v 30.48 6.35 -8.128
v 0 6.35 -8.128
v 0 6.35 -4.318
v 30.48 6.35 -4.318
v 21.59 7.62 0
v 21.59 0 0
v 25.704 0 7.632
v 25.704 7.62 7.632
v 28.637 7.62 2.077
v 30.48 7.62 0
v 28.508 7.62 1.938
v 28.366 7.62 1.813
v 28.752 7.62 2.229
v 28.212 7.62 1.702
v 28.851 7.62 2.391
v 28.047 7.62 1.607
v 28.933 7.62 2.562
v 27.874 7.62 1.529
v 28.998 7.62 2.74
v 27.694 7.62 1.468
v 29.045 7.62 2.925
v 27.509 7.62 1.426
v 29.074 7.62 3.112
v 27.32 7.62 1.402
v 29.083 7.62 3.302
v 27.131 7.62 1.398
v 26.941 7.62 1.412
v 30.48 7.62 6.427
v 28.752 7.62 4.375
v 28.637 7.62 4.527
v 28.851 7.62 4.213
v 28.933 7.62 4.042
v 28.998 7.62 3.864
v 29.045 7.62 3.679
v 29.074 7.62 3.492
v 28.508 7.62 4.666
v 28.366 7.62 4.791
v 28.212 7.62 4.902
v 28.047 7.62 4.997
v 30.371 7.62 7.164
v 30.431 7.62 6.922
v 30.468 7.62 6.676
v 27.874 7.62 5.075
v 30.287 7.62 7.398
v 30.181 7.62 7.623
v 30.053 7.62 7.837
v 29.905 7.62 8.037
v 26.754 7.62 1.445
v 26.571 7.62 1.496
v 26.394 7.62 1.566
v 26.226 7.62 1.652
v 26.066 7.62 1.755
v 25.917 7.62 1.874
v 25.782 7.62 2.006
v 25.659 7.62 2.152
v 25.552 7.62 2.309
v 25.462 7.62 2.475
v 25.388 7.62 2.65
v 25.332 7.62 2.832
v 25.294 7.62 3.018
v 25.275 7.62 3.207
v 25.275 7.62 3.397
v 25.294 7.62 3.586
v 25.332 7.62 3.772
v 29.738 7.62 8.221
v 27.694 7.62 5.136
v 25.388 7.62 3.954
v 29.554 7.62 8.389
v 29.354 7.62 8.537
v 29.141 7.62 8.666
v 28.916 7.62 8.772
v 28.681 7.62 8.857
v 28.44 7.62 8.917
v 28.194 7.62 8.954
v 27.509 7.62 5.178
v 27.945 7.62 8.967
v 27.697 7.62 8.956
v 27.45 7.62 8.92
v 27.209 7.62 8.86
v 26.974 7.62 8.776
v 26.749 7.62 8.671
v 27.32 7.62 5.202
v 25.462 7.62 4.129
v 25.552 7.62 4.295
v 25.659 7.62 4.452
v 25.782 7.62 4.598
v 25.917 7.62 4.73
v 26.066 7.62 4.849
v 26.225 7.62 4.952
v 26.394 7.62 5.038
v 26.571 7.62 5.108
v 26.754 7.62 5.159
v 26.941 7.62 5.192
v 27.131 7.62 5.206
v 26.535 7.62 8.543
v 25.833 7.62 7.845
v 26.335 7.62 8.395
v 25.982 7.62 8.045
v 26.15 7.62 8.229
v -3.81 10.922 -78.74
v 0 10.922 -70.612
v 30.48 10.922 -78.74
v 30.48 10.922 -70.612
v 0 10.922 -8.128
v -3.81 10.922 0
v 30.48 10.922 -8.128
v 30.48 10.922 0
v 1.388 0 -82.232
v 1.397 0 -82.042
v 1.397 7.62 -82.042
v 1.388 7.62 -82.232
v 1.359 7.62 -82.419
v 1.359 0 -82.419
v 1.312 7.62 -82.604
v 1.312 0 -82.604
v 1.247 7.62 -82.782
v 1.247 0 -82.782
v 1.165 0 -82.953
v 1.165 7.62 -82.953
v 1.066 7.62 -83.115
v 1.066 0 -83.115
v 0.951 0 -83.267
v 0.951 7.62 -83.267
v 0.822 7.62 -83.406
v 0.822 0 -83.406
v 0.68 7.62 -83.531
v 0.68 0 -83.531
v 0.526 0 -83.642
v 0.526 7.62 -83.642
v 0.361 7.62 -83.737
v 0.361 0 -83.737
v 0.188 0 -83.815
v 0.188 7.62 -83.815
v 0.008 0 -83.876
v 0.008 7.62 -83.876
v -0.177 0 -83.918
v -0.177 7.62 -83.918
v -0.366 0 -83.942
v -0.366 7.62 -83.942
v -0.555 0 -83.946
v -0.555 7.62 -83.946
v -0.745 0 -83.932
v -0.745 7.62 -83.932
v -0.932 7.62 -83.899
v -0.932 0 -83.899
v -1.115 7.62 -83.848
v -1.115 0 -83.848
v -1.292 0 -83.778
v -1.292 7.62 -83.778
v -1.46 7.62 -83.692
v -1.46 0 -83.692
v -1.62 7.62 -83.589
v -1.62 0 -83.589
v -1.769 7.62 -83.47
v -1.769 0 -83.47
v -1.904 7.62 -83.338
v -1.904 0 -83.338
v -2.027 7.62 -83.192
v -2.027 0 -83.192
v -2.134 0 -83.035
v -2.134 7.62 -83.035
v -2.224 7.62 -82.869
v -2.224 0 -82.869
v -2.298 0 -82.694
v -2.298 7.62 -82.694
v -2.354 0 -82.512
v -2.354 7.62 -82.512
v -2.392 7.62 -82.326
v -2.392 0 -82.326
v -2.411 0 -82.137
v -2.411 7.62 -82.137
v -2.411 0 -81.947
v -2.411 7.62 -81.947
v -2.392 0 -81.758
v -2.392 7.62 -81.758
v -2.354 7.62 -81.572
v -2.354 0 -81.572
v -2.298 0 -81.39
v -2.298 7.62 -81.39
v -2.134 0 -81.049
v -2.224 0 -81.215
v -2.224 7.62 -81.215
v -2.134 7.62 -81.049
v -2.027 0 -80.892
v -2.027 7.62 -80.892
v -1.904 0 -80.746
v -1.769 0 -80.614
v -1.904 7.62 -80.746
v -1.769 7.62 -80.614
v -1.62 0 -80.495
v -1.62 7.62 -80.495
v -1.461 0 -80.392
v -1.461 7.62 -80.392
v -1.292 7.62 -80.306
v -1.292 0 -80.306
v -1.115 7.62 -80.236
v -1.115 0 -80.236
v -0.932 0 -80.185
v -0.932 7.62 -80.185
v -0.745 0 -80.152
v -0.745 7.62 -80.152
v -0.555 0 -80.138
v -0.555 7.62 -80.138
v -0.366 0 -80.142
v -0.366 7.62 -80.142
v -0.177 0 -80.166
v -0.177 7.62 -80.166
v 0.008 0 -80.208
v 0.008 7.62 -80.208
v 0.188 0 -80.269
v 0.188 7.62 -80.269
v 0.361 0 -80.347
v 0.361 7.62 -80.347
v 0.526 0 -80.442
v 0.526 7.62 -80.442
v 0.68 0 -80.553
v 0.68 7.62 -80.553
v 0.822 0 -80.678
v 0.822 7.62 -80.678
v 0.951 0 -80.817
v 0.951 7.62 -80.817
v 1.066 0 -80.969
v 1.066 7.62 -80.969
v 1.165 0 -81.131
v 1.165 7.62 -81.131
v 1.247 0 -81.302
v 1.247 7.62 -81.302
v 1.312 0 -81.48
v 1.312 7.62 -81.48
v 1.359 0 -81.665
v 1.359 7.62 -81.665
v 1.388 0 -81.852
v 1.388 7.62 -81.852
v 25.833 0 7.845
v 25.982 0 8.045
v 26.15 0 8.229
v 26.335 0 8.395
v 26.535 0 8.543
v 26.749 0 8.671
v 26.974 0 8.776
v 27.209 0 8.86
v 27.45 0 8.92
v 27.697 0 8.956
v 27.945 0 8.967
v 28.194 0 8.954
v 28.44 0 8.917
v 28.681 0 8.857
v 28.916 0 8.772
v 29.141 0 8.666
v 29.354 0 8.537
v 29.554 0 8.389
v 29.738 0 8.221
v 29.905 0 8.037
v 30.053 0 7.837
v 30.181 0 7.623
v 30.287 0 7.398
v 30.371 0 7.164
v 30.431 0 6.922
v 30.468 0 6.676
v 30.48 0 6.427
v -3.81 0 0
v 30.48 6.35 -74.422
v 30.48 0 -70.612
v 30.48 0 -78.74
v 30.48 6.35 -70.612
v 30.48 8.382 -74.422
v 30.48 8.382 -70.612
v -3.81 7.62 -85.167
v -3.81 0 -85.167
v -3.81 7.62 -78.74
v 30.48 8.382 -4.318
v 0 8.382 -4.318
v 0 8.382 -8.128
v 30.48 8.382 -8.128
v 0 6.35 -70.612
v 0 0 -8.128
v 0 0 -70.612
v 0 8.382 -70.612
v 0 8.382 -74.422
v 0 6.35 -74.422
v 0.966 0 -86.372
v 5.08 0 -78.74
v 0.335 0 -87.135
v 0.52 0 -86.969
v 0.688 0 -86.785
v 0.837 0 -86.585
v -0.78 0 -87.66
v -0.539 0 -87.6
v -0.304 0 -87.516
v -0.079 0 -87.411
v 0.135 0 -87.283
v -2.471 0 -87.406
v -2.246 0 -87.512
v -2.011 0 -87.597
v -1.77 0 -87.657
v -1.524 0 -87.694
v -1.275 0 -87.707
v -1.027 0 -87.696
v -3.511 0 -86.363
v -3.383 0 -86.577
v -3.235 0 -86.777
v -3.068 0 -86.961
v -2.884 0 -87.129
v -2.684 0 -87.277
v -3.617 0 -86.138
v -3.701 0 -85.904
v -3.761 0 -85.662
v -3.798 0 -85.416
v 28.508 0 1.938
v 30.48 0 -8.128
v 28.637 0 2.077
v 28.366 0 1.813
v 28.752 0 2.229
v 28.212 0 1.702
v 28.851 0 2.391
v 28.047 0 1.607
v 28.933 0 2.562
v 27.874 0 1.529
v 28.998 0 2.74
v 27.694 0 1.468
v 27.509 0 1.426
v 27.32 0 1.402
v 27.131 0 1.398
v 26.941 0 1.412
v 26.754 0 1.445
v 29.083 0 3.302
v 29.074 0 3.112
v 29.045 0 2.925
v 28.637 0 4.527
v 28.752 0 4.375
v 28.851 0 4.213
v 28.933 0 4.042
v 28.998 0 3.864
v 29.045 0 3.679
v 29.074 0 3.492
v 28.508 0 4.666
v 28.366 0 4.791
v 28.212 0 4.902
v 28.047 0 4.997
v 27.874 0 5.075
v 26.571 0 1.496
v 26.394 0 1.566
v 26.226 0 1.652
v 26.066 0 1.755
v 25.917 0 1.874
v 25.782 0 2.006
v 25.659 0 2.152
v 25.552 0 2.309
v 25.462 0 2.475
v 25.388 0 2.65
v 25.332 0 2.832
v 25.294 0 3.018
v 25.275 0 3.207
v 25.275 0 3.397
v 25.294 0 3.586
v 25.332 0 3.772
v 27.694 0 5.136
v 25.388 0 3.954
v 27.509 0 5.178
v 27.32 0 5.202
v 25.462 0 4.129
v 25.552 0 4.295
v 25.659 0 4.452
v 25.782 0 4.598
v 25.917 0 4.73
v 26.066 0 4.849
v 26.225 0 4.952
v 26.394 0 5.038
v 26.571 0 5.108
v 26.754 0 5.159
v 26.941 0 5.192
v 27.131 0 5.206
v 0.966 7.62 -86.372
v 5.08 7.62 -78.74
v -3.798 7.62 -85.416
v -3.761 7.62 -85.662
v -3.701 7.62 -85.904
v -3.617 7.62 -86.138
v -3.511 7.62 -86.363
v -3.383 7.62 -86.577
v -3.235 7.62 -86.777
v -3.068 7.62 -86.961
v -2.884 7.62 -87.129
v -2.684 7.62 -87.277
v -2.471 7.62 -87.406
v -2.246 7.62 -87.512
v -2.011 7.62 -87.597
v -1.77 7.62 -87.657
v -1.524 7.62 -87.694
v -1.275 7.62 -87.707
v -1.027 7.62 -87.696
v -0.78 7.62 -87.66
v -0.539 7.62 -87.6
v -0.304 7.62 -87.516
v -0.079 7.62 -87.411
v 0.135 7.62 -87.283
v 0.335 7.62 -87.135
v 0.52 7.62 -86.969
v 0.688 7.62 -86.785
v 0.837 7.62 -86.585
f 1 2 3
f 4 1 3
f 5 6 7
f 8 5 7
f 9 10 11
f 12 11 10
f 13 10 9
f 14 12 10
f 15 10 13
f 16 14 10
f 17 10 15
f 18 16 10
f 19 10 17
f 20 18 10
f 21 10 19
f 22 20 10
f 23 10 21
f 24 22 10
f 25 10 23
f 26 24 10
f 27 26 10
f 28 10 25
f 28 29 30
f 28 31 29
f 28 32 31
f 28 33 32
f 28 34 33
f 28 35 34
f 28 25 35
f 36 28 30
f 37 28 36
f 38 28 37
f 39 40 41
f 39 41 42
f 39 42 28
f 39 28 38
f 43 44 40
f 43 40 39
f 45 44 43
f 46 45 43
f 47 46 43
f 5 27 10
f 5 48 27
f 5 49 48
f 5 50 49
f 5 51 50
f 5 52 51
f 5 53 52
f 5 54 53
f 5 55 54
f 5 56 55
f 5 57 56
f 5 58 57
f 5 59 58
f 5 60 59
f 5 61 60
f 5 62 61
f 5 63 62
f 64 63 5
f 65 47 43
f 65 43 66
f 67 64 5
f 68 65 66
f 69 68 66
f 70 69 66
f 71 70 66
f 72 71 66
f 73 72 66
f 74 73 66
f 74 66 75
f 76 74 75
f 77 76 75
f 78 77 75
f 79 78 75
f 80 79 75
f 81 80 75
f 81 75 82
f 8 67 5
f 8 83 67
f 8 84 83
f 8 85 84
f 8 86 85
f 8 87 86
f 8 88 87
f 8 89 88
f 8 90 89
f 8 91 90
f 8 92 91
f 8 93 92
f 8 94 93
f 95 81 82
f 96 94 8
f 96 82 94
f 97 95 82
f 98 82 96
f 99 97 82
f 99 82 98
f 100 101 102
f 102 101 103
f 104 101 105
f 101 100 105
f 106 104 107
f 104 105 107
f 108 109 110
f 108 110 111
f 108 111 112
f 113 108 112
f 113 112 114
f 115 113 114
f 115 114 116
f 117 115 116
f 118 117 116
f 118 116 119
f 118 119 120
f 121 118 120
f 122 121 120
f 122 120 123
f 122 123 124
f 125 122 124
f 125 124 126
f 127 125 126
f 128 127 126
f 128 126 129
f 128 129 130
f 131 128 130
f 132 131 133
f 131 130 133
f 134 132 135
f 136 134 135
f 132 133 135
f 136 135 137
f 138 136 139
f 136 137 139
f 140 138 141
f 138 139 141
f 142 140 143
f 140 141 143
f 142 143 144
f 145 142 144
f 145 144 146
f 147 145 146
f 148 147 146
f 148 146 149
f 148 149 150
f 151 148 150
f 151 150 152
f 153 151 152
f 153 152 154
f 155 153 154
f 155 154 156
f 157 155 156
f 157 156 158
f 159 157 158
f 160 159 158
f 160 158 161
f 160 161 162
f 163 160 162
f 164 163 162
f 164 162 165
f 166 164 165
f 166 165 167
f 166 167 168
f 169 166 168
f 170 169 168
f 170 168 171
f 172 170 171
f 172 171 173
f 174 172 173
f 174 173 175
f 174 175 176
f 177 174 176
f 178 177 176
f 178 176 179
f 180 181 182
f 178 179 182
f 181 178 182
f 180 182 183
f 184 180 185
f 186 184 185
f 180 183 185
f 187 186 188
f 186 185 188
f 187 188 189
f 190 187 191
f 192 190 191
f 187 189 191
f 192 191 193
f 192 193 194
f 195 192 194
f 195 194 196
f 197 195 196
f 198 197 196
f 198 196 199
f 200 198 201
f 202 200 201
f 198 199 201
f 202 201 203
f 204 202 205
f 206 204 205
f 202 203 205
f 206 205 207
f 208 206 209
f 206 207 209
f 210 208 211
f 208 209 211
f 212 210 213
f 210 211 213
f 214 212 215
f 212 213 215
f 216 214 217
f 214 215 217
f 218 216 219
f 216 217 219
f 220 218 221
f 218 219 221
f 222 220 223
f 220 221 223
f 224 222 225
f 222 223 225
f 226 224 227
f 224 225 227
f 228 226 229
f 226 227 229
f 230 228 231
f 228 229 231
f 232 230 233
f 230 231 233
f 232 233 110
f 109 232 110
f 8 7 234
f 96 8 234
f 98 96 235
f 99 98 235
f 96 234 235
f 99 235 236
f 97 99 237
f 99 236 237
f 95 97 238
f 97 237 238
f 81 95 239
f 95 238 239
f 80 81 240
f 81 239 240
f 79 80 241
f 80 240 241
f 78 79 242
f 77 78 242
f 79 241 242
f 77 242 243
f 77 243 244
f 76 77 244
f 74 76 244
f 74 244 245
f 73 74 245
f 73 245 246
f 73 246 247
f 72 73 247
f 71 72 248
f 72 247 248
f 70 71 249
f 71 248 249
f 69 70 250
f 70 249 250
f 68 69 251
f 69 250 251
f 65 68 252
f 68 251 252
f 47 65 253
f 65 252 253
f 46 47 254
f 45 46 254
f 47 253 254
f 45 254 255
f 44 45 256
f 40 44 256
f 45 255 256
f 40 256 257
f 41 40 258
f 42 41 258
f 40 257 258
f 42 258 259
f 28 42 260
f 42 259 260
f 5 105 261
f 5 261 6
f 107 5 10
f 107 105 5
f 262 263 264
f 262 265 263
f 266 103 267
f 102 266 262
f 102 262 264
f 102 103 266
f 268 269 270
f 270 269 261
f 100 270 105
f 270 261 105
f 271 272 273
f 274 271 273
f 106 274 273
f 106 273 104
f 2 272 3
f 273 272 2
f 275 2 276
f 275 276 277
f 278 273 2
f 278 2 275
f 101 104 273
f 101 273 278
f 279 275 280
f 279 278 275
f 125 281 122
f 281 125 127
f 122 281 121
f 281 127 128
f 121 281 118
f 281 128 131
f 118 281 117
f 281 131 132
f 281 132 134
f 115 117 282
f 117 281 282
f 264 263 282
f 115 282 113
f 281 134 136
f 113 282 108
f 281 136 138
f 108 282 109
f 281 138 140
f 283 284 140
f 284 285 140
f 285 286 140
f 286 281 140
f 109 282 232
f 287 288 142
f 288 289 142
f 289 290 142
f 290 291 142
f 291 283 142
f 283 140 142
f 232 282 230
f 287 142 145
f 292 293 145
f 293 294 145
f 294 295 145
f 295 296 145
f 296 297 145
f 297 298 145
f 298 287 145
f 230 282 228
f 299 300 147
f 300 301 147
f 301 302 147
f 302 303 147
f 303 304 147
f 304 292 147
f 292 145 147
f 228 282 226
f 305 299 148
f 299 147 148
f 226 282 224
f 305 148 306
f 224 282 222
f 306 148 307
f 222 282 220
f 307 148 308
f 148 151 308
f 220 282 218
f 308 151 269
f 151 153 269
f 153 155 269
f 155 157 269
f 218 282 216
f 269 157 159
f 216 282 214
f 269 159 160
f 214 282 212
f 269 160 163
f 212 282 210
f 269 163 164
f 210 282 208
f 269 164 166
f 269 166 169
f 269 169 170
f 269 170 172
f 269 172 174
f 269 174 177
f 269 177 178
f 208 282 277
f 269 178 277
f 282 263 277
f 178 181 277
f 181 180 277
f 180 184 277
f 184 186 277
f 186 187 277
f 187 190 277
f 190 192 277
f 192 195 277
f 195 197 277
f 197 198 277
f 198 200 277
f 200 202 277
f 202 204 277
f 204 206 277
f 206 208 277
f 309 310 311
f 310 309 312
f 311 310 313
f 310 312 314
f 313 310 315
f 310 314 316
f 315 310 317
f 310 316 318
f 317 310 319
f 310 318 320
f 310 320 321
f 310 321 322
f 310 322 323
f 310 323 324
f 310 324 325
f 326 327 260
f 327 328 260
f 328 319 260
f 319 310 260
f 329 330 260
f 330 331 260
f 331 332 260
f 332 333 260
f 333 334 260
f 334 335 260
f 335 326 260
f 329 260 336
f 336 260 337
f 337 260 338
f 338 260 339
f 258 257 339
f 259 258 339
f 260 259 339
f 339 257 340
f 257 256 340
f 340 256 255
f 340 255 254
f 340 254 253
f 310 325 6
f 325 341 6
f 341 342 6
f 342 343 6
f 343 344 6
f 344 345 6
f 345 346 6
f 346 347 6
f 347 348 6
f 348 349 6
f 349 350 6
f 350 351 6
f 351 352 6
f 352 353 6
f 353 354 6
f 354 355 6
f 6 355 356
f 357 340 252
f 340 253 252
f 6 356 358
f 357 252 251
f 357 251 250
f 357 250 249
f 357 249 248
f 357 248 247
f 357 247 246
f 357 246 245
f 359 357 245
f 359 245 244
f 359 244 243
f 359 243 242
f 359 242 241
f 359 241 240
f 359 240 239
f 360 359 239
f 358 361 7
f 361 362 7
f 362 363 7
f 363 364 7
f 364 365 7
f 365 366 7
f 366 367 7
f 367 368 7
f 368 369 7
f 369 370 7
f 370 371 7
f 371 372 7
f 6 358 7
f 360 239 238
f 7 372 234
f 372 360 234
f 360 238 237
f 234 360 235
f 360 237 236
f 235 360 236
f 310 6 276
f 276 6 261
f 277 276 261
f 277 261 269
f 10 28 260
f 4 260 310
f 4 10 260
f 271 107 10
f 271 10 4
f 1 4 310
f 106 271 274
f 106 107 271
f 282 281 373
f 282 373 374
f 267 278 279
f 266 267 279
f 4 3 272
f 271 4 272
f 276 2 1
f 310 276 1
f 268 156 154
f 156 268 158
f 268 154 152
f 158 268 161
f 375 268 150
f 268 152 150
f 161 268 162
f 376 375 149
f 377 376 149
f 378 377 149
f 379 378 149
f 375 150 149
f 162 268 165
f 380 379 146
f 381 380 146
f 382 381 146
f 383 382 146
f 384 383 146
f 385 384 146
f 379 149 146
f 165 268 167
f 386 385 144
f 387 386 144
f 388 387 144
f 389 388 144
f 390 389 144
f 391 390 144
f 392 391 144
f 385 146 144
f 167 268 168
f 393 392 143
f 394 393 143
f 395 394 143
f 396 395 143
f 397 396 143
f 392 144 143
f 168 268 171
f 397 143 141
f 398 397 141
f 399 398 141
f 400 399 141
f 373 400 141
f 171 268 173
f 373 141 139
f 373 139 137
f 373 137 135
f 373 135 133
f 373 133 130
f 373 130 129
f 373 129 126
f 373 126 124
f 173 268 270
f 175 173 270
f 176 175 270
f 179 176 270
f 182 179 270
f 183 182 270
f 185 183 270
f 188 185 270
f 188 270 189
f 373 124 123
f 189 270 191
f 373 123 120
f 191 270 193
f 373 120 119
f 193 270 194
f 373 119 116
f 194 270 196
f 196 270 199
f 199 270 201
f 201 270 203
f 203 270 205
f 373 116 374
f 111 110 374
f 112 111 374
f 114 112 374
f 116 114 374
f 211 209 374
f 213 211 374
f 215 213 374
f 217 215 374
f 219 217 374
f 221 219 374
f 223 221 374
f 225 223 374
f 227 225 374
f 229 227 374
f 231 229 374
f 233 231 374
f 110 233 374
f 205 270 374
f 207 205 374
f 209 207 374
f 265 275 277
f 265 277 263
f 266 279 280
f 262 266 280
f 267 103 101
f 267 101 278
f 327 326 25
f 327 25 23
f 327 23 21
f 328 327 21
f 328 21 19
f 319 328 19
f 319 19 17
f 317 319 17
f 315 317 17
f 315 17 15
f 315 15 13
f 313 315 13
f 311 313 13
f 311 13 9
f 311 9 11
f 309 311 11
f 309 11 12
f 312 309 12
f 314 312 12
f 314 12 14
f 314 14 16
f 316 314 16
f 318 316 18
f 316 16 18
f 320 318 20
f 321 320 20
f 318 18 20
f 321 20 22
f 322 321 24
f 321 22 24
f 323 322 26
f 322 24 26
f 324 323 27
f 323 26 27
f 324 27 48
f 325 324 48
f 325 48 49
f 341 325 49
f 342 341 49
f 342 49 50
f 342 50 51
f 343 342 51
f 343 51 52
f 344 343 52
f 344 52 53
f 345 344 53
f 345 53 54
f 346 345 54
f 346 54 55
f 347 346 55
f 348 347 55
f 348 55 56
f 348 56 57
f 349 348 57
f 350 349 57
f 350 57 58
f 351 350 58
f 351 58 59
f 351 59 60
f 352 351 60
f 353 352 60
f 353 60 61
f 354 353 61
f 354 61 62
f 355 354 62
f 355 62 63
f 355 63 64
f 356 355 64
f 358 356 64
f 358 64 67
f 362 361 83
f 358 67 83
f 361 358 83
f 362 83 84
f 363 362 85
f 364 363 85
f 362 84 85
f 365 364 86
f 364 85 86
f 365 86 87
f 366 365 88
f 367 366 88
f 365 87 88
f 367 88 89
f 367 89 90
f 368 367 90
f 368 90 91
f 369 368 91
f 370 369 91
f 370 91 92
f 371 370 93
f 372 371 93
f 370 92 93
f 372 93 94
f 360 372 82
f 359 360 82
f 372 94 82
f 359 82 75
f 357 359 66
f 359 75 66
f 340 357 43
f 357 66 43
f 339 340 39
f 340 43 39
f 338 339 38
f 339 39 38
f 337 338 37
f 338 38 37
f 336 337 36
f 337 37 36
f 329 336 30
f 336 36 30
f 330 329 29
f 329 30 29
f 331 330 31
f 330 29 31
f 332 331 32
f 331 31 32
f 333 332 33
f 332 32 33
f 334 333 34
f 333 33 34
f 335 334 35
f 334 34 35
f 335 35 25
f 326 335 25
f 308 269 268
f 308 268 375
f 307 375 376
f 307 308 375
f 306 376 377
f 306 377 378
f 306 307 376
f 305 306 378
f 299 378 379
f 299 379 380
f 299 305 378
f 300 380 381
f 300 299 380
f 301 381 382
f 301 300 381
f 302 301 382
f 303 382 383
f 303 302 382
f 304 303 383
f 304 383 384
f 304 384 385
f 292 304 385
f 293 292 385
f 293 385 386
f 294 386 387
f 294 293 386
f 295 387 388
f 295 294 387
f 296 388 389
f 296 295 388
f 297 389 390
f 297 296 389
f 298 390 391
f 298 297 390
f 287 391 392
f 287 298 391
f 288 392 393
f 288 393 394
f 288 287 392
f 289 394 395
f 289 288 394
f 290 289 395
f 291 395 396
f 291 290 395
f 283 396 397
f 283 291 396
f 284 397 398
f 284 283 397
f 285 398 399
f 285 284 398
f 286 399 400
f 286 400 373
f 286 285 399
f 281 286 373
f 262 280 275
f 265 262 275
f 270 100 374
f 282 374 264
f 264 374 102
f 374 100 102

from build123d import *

# Parameters (mm, degrees)
BOSS_EXTRUDE1_DEPTH = 30.48
SKETCH2_W           = 3.81
SKETCH2_H           = 10.922
BOSS_EXTRUDE2_DEPTH = 78.74
BOSS_EXTRUDE3_DEPTH = 7.62
SKETCH5_R           = 1.905
CUT_EXTRUDE2_DEPTH  = 8.62
SKETCH6_W           = 30.48
SKETCH6_H           = 62.484
CUT_EXTRUDE3_DEPTH  = 7.35


with BuildPart() as part:
    # Sketch1 → Boss-Extrude1 (new body)
    with BuildSketch(Plane(origin=(0, 0, 0), x_dir=(0, 0, -1), z_dir=(1, 0, 0))):
        Polygon((0, 0), (78.74, 0), (78.74, 10.922), (70.612, 10.922), (70.612, 8.382), (74.422, 8.382), (74.422, 6.35), (4.318, 6.35), (4.318, 8.382), (8.128, 8.382), (8.128, 10.922), (0, 10.922), align=None)
    extrude(amount=BOSS_EXTRUDE1_DEPTH)

    # Sketch2 → Boss-Extrude2 (add)
    with BuildSketch(Plane.XY):
        with Locations((-1.905, 5.461)):
            Rectangle(SKETCH2_W, SKETCH2_H)
    extrude(amount=-BOSS_EXTRUDE2_DEPTH)

    # Sketch4 → Boss-Extrude3 (add)
    with BuildSketch(Plane.XZ):
        with BuildLine():
            Line((21.59, 0), (25.704138816, 7.632415502))
            ThreePointArc((25.704138816, 7.632415502), (28.56149521, 8.89), (30.48, 6.427208148))
            Line((30.48, 6.427208148), (30.48, 0))
            Line((30.48, 0), (21.59, 0))
        make_face()
        with BuildLine():
            Line((-3.81, -78.74), (-3.81, -85.167208148))
            ThreePointArc((-3.81, -85.167208148), (-1.89149521, -87.63), (0.965861184, -86.372415502))
            Line((0.965861184, -86.372415502), (5.08, -78.74))
            Line((5.08, -78.74), (-3.81, -78.74))
        make_face()
    extrude(amount=-BOSS_EXTRUDE3_DEPTH)

    # Sketch5 → Cut-Extrude2 (cut, through all)
    with BuildSketch(Plane(origin=(0, 7.62, 0), x_dir=(1, 0, 0), z_dir=(0, 1, 0))):
        with Locations((-0.508, 82.042)):
            Circle(SKETCH5_R)
        with Locations((27.178, -3.302)):
            Circle(SKETCH5_R)
    extrude(amount=-CUT_EXTRUDE2_DEPTH, mode=Mode.SUBTRACT)

    # Sketch6 → Cut-Extrude3 (cut, through all)
    with BuildSketch(Plane(origin=(0, 6.35, 0), x_dir=(1, 0, 0), z_dir=(0, 1, 0))):
        with Locations((15.24, 39.37)):
            Rectangle(SKETCH6_W, SKETCH6_H)
    extrude(amount=-CUT_EXTRUDE3_DEPTH, mode=Mode.SUBTRACT)


solid = part.part
